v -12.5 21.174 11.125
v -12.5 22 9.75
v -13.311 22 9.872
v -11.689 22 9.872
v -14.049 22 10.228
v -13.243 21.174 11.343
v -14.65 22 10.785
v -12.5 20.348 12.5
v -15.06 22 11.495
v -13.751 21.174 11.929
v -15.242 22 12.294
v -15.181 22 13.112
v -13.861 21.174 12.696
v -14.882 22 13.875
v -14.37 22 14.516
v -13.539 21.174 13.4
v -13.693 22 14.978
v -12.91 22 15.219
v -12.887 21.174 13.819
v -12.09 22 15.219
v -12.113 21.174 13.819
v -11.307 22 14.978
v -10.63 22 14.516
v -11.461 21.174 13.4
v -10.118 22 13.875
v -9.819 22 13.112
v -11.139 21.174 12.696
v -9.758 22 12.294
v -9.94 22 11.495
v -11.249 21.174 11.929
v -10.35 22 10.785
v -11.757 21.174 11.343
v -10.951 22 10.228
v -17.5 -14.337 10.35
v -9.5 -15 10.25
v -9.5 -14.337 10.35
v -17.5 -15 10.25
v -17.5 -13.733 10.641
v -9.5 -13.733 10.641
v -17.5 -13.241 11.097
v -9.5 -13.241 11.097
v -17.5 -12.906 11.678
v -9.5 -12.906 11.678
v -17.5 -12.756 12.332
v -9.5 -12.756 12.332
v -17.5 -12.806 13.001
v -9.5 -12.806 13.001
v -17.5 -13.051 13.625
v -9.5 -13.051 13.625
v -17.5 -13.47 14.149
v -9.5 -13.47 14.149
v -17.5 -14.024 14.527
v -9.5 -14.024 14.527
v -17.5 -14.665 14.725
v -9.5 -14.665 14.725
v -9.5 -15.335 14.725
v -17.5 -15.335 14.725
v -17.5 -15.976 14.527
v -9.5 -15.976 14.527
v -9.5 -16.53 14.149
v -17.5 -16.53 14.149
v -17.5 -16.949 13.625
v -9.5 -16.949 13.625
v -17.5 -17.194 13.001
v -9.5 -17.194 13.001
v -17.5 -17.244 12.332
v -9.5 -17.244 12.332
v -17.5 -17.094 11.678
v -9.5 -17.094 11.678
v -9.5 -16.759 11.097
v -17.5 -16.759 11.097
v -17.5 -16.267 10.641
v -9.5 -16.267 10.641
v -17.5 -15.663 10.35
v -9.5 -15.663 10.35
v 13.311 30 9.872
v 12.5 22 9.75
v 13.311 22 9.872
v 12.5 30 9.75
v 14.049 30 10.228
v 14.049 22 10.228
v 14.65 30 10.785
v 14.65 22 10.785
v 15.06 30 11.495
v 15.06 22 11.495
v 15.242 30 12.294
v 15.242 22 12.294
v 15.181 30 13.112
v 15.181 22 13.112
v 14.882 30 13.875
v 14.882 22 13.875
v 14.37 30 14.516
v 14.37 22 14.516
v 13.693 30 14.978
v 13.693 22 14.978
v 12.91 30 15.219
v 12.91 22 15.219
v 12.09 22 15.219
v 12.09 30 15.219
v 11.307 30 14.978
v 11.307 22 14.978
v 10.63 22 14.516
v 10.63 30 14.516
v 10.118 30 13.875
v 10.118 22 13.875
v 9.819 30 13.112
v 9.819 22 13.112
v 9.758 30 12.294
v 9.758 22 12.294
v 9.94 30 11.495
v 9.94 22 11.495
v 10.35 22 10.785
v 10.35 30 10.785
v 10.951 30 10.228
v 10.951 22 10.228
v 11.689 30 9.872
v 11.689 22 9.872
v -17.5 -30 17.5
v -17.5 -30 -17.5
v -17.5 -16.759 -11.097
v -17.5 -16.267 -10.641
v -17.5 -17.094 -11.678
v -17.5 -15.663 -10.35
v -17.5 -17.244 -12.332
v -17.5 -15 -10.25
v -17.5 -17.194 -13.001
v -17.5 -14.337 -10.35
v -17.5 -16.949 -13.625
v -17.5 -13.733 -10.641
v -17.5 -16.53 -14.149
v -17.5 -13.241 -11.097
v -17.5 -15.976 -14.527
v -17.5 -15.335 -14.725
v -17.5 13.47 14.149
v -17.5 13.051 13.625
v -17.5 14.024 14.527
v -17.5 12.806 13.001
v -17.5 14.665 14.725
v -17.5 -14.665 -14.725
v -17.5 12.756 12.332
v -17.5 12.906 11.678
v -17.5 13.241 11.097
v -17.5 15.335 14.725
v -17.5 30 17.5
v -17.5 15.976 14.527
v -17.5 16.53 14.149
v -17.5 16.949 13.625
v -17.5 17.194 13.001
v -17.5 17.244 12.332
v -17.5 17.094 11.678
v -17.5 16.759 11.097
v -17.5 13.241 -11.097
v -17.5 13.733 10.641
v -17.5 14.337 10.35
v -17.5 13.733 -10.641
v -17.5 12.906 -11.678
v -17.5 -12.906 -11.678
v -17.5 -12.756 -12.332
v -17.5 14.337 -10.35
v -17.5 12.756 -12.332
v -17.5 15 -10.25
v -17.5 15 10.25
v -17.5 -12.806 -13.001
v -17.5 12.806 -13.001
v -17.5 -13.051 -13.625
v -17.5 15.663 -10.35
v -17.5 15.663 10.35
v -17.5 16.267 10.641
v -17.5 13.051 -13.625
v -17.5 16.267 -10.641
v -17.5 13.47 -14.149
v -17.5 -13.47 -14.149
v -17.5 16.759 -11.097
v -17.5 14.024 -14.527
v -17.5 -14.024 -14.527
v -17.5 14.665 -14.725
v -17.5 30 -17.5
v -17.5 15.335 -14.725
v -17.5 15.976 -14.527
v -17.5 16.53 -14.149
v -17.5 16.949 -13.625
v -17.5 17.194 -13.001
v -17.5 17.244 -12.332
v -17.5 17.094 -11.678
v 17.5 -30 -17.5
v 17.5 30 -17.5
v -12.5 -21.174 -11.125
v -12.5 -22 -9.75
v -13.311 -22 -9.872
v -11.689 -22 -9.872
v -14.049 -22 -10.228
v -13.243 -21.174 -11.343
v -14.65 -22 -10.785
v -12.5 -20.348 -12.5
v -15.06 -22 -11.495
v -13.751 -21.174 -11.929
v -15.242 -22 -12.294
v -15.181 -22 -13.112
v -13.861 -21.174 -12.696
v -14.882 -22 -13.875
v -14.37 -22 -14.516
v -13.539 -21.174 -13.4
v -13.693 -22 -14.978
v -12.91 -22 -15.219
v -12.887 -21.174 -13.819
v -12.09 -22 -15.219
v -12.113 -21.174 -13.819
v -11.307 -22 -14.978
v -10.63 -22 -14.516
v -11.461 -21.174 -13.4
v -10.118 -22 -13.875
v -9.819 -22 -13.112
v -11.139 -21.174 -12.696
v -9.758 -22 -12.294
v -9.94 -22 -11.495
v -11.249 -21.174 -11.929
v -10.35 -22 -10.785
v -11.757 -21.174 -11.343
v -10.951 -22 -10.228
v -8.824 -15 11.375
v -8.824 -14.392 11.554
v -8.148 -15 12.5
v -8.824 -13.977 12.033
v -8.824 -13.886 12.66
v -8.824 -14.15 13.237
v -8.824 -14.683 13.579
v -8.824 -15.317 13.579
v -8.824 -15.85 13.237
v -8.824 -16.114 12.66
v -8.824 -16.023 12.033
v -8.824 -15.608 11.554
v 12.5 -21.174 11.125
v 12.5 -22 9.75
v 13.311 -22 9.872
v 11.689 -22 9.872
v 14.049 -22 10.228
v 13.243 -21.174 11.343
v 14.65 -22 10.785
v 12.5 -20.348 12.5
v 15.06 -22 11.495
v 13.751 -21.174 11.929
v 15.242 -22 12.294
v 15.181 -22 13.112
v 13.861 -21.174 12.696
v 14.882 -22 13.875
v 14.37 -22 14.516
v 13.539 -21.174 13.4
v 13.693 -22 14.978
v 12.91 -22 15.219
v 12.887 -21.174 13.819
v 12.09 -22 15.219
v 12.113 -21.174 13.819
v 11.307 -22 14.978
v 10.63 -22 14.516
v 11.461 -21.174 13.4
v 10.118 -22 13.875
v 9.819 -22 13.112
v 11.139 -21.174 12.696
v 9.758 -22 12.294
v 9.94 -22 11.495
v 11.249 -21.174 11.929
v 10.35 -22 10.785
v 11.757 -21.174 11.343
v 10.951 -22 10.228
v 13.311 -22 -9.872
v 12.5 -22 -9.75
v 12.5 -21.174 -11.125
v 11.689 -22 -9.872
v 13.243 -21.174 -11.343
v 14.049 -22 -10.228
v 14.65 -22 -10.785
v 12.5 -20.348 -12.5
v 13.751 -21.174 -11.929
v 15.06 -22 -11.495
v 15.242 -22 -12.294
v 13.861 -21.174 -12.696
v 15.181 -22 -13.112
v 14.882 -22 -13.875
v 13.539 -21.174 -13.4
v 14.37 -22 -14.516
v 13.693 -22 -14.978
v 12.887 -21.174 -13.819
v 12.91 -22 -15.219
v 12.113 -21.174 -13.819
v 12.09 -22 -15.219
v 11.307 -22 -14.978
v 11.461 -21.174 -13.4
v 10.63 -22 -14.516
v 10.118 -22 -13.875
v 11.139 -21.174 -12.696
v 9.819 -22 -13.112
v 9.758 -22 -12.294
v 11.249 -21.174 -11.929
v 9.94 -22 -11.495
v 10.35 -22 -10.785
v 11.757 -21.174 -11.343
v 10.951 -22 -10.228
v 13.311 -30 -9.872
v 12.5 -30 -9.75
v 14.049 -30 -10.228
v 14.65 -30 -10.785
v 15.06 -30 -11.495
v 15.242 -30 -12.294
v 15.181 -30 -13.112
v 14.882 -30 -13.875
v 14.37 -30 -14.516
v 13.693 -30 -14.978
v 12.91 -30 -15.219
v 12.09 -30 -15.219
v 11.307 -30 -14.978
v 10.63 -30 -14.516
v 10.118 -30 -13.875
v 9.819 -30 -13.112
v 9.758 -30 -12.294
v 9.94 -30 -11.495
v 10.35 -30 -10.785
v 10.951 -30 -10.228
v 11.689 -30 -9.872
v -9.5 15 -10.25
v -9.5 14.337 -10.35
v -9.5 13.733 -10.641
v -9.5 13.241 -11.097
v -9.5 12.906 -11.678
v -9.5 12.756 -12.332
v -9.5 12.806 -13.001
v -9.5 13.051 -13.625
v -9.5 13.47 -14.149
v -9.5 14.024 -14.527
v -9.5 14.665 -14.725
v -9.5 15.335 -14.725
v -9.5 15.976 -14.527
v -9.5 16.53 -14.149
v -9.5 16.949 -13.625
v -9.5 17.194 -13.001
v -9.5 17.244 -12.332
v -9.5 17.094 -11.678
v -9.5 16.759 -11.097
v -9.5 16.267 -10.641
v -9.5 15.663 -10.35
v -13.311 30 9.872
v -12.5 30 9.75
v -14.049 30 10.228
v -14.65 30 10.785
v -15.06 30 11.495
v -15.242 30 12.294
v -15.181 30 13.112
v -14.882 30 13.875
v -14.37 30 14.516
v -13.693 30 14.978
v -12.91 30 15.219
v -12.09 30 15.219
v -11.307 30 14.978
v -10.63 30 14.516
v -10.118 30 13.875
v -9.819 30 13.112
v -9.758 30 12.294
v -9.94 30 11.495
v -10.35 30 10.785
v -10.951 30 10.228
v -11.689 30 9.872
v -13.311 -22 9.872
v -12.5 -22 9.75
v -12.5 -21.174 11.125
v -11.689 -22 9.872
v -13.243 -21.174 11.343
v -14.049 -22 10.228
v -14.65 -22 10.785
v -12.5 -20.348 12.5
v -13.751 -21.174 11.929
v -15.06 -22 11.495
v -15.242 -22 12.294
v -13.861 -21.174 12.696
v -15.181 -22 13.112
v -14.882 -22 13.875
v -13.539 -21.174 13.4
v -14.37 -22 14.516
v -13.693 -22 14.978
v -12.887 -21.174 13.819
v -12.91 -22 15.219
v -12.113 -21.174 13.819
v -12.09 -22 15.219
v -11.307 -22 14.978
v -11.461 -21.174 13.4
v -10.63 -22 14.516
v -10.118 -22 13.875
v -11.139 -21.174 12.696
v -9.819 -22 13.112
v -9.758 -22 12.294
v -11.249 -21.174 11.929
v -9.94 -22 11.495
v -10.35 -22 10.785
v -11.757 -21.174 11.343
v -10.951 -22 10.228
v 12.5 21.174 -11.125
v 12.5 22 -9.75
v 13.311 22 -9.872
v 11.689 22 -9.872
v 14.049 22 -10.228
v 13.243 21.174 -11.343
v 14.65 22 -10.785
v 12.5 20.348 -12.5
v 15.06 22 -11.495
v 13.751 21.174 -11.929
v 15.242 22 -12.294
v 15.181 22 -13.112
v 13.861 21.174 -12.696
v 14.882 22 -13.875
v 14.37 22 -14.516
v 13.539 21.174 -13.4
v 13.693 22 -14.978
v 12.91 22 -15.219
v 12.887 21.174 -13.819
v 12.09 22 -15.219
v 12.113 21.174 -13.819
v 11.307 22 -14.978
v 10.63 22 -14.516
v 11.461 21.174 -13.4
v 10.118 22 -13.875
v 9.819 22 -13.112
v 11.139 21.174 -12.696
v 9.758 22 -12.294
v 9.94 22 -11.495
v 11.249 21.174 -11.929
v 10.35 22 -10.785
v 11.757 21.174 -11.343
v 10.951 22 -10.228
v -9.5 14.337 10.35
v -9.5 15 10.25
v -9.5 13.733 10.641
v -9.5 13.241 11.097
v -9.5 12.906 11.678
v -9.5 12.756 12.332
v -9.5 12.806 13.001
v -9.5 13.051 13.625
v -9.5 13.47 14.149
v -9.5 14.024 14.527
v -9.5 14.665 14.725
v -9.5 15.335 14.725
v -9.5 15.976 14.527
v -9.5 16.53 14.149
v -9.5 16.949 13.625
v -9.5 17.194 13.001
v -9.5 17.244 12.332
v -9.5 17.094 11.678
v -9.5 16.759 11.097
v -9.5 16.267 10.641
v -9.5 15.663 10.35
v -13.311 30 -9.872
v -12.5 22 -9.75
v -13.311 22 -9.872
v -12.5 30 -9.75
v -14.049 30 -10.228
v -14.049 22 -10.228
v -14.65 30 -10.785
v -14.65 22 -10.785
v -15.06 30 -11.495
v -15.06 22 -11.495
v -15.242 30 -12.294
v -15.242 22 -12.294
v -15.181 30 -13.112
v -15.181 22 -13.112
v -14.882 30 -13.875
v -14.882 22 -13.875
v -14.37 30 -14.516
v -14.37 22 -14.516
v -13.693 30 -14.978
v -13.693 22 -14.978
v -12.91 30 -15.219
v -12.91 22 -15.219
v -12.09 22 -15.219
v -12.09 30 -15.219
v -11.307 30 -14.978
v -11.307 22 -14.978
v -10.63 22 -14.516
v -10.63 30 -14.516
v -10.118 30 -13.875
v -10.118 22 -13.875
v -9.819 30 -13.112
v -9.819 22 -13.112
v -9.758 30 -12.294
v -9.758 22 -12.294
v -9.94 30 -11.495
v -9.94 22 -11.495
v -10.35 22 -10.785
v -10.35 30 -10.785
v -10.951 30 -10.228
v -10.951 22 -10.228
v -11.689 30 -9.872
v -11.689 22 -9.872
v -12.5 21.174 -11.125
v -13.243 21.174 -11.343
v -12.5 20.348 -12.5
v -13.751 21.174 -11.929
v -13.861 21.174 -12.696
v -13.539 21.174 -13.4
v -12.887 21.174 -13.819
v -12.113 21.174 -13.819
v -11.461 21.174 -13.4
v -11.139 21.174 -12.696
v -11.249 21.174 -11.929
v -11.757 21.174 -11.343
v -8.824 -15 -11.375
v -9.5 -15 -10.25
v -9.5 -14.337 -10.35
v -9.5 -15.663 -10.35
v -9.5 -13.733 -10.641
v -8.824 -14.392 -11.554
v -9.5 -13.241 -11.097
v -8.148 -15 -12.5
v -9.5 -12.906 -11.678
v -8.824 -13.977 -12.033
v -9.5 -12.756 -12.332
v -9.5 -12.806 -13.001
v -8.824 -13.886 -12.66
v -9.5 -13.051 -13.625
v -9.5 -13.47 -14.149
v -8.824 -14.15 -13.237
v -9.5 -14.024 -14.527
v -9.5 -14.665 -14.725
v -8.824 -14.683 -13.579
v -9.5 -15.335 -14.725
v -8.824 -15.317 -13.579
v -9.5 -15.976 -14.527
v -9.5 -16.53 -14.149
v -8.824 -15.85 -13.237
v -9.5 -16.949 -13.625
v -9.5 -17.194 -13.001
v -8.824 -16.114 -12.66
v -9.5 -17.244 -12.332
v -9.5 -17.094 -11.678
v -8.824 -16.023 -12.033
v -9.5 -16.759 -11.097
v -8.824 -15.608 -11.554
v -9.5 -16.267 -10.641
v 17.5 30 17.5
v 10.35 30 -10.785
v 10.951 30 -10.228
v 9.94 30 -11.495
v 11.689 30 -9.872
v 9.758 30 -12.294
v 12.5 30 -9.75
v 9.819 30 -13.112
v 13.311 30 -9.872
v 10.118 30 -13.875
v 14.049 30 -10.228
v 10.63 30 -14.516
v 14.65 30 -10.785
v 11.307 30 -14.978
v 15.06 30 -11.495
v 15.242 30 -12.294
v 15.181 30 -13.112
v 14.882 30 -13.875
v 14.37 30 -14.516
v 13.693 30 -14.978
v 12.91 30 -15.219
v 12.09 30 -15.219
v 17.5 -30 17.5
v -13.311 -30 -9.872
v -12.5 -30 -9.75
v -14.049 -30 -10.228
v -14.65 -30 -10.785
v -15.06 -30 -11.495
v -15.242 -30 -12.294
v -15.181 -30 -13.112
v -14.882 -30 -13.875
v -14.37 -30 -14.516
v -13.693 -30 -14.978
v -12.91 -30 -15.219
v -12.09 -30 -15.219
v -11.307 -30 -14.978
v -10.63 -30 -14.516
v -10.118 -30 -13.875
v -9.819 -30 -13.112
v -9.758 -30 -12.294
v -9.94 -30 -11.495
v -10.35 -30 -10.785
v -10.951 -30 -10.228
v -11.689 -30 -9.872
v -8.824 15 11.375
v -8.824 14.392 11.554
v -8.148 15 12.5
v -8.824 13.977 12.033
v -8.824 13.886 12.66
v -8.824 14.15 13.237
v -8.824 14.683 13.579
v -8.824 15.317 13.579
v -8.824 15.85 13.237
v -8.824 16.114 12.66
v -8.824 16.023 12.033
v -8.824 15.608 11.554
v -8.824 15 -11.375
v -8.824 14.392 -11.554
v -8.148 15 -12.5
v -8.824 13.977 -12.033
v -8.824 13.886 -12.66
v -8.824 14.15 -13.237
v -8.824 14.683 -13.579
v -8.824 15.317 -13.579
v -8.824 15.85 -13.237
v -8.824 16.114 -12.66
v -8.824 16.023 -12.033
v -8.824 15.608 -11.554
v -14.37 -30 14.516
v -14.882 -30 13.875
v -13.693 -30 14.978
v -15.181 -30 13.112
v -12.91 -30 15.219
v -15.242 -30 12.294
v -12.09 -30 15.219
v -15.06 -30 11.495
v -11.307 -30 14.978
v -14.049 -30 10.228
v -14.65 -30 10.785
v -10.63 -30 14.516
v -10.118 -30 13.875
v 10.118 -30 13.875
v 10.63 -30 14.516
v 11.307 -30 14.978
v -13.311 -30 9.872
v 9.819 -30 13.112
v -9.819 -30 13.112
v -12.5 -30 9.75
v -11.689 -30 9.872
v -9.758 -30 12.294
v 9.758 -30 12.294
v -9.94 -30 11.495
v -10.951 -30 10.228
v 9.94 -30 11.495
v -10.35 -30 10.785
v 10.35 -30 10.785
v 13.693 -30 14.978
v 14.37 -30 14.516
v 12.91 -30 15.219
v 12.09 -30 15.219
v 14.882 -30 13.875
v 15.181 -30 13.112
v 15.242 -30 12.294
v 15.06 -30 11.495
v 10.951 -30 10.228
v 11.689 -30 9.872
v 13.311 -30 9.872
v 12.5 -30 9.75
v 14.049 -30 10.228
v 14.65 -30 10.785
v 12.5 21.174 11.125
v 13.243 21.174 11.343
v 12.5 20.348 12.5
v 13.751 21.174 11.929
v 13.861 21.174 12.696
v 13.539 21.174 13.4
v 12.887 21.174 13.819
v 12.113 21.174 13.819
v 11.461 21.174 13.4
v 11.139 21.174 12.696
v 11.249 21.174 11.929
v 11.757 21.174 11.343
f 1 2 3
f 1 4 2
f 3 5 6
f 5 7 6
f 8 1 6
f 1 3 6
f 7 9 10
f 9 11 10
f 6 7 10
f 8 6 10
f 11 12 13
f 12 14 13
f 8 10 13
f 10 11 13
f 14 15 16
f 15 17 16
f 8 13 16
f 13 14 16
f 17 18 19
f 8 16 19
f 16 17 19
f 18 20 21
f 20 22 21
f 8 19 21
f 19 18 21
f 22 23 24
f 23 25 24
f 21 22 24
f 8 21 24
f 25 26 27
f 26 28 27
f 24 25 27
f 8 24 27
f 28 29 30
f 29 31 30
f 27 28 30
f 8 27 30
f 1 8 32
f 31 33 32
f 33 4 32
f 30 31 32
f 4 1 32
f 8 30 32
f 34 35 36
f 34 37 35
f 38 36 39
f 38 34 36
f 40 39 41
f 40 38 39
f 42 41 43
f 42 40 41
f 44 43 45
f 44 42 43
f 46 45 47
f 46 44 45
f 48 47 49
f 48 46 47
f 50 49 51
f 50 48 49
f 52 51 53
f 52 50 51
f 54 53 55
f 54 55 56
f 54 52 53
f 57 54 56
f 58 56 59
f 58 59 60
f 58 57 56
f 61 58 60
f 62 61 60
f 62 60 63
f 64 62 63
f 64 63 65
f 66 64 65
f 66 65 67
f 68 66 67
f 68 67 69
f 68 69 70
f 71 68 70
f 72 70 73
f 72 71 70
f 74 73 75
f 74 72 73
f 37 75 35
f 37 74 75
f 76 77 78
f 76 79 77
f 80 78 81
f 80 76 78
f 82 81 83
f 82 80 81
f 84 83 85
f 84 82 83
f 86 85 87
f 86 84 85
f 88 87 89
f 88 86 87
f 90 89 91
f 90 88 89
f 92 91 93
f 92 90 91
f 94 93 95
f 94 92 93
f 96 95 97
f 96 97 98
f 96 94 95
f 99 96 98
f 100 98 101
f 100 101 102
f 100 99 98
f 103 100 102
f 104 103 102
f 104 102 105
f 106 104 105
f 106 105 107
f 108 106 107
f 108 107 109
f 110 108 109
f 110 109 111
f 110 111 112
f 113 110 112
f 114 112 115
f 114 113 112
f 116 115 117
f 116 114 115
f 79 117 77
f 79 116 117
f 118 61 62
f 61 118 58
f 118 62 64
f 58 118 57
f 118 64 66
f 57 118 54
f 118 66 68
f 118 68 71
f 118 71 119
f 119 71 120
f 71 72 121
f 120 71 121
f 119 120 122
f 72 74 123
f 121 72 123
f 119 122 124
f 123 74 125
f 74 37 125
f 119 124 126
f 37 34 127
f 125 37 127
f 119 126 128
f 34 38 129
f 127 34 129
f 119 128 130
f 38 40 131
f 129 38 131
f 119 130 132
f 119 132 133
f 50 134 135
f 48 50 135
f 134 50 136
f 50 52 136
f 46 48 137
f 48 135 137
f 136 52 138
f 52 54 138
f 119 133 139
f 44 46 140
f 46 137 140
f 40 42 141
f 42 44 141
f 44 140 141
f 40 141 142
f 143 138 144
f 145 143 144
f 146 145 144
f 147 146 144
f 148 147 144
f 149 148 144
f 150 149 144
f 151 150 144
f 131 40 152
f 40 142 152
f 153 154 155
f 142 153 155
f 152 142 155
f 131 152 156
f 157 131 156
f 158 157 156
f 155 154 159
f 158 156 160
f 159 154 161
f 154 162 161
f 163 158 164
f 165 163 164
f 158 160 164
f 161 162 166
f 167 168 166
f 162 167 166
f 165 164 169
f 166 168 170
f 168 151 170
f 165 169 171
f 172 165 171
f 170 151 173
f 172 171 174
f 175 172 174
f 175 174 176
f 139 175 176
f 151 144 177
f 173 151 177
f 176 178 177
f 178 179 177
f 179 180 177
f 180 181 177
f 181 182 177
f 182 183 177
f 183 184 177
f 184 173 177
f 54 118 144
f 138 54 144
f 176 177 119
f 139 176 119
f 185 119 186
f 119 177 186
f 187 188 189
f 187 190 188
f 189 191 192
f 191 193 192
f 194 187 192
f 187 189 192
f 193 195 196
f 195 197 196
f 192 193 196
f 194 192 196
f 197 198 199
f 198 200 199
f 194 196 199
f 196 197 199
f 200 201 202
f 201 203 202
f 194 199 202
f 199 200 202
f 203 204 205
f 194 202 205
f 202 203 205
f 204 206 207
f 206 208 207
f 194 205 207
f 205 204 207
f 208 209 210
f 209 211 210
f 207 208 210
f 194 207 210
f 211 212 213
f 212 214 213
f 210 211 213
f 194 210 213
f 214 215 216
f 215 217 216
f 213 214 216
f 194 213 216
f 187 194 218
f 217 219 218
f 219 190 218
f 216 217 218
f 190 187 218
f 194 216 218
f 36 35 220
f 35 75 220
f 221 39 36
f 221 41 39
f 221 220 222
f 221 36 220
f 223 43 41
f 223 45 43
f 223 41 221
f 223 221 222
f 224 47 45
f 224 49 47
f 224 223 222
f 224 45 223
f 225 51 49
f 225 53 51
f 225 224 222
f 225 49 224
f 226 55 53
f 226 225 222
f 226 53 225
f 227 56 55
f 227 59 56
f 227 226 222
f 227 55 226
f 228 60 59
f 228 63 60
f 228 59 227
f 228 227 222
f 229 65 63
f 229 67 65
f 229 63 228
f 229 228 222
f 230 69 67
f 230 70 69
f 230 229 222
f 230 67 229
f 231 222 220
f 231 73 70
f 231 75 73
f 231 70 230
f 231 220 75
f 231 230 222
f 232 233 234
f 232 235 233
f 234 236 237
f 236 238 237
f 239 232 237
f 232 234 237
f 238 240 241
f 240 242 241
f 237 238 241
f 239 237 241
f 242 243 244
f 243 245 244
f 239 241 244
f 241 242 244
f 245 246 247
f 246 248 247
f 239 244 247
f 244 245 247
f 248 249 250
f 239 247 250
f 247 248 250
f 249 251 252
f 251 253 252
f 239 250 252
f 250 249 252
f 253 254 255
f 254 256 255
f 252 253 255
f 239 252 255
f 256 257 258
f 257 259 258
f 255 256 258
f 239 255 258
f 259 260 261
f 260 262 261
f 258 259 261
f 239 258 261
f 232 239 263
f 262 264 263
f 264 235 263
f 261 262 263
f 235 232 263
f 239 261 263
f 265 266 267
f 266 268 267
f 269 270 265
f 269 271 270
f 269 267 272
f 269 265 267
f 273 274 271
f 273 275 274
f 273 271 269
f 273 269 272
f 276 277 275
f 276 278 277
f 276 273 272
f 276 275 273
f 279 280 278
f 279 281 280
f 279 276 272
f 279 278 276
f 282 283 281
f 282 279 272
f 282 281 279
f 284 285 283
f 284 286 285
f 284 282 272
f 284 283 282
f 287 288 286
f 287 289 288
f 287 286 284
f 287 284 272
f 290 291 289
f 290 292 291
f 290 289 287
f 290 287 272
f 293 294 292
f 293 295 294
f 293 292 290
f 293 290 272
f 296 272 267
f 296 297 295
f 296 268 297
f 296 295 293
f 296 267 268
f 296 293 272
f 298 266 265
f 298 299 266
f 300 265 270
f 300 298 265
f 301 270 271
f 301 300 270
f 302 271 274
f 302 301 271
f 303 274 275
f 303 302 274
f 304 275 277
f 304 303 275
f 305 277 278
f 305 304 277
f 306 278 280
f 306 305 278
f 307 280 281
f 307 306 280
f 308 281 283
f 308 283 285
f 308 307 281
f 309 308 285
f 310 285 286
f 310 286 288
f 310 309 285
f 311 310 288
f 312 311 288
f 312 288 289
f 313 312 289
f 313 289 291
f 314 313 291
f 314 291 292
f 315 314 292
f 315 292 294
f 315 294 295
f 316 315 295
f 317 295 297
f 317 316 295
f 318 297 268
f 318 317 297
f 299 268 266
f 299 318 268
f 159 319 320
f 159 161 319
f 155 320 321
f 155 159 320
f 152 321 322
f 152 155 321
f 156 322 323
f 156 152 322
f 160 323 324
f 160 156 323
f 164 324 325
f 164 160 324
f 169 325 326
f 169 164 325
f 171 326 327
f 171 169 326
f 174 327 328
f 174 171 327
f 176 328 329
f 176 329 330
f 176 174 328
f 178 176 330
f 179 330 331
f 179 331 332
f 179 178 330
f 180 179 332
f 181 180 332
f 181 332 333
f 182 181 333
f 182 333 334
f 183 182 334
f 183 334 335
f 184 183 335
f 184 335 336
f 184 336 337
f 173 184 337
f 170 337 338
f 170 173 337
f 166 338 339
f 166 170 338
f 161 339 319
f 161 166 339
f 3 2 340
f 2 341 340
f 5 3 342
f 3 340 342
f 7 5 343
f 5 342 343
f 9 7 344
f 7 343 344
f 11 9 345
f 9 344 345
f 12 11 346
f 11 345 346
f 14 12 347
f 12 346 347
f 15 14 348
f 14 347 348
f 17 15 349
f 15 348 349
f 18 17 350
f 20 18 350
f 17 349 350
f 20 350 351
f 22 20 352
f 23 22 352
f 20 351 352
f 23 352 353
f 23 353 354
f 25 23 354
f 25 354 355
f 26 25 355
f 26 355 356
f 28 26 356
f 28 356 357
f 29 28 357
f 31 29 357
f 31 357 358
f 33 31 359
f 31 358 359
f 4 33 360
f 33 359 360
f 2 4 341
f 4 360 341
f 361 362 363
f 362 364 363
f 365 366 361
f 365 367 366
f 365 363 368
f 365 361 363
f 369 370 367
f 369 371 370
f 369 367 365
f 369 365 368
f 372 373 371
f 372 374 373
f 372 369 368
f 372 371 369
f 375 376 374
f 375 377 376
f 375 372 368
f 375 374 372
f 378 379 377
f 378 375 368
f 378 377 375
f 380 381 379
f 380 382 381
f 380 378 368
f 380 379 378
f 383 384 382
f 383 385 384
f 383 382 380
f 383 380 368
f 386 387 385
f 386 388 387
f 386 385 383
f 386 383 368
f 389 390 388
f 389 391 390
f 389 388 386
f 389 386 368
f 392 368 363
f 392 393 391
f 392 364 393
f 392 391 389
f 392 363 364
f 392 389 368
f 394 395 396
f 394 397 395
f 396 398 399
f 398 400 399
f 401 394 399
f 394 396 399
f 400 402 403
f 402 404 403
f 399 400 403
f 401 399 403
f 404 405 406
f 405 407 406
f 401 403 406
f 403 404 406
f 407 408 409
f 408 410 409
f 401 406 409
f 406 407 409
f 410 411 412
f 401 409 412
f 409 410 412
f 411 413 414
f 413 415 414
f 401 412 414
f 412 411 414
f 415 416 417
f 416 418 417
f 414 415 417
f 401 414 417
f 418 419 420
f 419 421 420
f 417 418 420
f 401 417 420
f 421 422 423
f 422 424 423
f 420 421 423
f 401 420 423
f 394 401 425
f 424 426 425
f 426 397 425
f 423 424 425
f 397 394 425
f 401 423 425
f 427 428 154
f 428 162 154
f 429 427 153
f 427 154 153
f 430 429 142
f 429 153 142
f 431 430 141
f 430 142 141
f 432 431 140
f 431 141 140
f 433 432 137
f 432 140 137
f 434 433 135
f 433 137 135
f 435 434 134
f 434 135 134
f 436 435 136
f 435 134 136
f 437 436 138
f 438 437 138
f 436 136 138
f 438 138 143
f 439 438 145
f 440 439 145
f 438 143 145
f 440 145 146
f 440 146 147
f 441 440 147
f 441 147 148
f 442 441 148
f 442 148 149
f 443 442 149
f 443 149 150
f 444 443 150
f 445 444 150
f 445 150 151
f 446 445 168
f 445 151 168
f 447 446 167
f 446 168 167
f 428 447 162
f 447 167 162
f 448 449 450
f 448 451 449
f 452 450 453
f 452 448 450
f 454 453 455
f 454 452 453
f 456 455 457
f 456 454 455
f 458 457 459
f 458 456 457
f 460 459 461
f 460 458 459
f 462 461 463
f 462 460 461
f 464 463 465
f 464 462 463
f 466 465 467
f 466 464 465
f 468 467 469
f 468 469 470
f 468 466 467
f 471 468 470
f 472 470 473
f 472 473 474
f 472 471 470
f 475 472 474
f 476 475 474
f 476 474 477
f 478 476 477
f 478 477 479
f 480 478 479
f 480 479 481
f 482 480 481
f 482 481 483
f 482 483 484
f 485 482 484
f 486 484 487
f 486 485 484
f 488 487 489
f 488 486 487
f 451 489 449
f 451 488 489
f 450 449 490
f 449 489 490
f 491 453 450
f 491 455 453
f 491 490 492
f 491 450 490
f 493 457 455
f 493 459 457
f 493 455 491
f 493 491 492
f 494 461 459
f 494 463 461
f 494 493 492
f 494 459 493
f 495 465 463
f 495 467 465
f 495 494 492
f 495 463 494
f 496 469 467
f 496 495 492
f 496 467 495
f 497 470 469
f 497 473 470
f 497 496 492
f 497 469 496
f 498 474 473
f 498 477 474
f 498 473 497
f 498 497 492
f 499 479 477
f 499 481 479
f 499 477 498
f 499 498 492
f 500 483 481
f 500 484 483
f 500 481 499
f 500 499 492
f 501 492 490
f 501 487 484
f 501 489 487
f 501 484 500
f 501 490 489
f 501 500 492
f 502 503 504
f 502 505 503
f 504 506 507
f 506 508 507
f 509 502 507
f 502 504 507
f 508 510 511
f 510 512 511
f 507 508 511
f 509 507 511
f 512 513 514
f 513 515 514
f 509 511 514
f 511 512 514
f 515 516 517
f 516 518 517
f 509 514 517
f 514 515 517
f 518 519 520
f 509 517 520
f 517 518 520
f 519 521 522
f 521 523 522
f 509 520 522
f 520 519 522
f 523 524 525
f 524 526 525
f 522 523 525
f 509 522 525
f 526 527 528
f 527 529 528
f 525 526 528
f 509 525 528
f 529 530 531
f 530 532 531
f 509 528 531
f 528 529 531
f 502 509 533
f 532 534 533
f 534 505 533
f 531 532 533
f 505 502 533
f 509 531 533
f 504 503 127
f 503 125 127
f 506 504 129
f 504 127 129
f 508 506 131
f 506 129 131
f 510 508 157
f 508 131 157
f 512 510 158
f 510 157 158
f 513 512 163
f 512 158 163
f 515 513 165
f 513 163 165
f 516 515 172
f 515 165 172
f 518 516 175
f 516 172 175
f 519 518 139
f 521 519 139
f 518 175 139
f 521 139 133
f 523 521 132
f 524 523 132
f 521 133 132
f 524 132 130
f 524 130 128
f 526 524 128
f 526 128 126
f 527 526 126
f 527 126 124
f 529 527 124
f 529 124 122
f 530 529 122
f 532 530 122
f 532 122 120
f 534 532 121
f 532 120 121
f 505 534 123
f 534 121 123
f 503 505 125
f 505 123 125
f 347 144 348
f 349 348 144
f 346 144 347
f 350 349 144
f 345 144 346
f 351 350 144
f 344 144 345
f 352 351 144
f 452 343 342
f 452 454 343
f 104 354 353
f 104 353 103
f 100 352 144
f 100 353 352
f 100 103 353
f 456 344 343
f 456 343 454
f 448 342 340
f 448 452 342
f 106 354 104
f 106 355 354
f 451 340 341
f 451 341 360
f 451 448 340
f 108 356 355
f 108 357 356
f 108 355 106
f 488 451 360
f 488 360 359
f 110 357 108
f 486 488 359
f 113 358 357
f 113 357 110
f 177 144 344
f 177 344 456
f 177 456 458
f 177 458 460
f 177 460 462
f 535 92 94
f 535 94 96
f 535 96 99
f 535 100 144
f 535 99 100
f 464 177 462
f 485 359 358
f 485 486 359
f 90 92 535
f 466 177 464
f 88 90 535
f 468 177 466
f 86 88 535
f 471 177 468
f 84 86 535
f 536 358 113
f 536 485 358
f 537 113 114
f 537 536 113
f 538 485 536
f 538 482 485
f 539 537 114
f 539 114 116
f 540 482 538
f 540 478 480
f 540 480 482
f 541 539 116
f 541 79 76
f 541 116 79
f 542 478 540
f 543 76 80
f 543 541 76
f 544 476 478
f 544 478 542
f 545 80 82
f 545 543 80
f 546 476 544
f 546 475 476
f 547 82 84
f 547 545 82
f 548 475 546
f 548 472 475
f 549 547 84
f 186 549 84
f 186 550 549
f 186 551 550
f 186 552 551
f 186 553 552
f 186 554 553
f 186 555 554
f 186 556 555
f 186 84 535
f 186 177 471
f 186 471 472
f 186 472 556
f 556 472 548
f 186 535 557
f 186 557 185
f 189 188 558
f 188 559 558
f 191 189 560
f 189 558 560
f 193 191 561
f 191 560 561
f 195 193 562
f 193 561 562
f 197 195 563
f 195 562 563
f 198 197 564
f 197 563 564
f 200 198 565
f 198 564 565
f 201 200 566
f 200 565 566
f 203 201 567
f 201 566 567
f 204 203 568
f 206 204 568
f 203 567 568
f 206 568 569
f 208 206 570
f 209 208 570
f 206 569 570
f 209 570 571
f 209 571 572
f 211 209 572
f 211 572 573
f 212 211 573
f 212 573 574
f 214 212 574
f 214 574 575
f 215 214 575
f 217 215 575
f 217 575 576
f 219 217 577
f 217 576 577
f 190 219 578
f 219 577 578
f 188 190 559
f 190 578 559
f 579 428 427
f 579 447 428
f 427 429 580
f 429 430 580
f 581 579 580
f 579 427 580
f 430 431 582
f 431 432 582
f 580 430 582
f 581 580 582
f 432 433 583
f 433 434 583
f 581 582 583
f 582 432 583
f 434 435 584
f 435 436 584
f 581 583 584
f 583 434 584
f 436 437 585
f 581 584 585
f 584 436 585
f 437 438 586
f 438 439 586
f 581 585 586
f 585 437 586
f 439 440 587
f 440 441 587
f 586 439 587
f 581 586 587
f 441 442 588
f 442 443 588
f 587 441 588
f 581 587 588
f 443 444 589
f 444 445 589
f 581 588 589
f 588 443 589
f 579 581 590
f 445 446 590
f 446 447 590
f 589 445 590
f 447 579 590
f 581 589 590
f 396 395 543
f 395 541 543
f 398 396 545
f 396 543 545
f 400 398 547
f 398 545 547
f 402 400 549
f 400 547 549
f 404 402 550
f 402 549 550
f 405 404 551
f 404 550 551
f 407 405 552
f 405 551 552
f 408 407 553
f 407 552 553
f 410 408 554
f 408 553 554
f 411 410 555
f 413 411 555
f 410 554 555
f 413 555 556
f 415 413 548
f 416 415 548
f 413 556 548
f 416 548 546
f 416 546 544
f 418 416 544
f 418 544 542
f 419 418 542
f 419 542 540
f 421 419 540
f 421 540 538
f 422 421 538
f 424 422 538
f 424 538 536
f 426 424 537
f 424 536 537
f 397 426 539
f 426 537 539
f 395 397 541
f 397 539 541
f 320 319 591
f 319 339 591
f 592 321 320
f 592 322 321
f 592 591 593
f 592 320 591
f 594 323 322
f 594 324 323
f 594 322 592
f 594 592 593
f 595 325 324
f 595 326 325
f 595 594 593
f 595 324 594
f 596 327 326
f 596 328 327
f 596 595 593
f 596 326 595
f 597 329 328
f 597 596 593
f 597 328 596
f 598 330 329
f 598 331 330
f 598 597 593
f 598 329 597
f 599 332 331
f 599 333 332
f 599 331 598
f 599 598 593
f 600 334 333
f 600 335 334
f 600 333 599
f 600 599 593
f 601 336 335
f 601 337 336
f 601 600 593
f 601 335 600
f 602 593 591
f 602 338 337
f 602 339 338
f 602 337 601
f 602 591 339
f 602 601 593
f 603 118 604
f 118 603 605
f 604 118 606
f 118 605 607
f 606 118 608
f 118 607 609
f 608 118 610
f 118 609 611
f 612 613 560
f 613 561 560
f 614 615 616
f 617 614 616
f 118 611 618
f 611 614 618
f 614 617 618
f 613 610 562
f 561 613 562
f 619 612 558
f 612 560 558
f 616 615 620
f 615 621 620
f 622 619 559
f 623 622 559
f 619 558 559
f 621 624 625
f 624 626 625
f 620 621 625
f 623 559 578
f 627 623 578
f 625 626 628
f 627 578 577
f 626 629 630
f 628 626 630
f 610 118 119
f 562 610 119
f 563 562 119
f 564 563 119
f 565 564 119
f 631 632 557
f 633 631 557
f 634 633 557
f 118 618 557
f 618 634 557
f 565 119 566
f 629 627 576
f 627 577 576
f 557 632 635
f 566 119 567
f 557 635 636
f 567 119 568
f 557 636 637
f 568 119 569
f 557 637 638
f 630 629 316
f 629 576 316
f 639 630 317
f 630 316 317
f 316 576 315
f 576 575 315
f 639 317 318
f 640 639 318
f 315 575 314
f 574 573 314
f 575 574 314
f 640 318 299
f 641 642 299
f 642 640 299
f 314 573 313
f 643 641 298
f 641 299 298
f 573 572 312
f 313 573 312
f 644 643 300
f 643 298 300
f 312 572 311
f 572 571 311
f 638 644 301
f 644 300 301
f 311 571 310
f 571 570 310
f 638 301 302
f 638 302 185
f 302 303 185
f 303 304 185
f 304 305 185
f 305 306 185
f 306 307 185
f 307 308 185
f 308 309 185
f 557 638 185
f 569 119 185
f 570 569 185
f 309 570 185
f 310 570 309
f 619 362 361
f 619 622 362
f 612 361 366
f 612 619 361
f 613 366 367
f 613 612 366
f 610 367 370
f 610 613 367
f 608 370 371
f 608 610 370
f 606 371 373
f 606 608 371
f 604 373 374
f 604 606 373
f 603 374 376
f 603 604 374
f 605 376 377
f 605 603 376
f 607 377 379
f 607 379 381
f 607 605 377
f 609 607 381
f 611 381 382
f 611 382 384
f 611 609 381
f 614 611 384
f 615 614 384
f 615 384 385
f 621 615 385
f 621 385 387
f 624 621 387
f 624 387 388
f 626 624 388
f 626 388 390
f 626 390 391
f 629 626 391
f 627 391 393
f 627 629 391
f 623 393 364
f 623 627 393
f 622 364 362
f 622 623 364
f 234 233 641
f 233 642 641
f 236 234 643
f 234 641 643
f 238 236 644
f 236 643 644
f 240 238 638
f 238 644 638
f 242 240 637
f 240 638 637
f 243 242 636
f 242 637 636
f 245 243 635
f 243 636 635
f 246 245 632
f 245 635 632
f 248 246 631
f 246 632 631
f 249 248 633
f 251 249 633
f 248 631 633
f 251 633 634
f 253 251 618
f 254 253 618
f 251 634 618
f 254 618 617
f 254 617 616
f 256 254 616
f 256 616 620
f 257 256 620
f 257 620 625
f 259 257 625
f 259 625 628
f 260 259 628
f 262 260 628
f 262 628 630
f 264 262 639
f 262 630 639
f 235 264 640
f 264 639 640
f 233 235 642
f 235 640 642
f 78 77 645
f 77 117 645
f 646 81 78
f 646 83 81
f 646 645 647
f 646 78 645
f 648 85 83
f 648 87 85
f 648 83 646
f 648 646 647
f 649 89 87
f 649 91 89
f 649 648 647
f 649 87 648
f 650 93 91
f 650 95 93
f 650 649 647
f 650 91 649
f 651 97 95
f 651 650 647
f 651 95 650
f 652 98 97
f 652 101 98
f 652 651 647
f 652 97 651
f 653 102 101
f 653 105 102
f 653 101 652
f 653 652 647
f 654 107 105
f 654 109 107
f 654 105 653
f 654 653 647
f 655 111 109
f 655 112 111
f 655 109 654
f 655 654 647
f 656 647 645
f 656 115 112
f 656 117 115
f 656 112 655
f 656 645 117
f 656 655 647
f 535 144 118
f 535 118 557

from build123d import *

# Parameters (mm, degrees)
SKETCH1_W           = 35
SKETCH1_H           = 35
BOSS_EXTRUDE1_DEPTH = 30


with BuildPart() as part:
    # Sketch1 → Boss-Extrude1 (new, symmetric)
    with BuildSketch(Plane(origin=(0, 0, 0), x_dir=(1, 0, 0), z_dir=(0, 1, 0))):
        Rectangle(SKETCH1_W, SKETCH1_H)
    extrude(amount=BOSS_EXTRUDE1_DEPTH, both=True)

    # Sketch3 → M5 Clearance Hole1 (revolve, cut)
    with BuildSketch(Plane(origin=(-12.5, 30, -12.5), x_dir=(0, 0, 1), z_dir=(1, 0, 0))):
        Polygon((0, 0), (0, 9.652366702), (2.75, 8), (2.75, 0), align=None)
    m5_clearance_hole1 = revolve(axis=Axis((-12.5, 36.35, -12.5), (0, -1, 0)), mode=Mode.SUBTRACT)

    # Mirror1: M5 Clearance Hole1 across plane
    add(m5_clearance_hole1.mirror(Plane(origin=(0, 0, 0), x_dir=(0, 0, 1), z_dir=(1, 0, 0))), mode=Mode.SUBTRACT)

    # Mirror2: M5 Clearance Hole1 across plane
    add(m5_clearance_hole1.mirror(Plane.XY), mode=Mode.SUBTRACT)

    # Mirror2 copy 1 sketch → Mirror2 copy 1 (revolve, cut)
    with BuildSketch(Plane(origin=(12.5, 30, 12.5), x_dir=(0, 0, -1), z_dir=(-1, 0, 0))):
        Polygon((0, 0), (0, 9.652366702), (2.75, 8), (2.75, 0), align=None)
    revolve(axis=Axis((12.5, 36.35, 12.5), (0, -1, 0)), mode=Mode.SUBTRACT)

    # Mirror3: M5 Clearance Hole1 across plane
    add(m5_clearance_hole1.mirror(Plane.ZX), mode=Mode.SUBTRACT)

    # Mirror3 copy 1 sketch → Mirror3 copy 1 (revolve, cut)
    with BuildSketch(Plane(origin=(12.5, -30, -12.5), x_dir=(0, 0, 1), z_dir=(-1, 0, 0))):
        Polygon((0, 0), (0, 9.652366702), (2.75, 8), (2.75, 0), align=None)
    revolve(axis=Axis((12.5, -36.35, -12.5), (0, 1, 0)), mode=Mode.SUBTRACT)

    # Mirror3 copy 2 sketch → Mirror3 copy 2 (revolve, cut)
    with BuildSketch(Plane(origin=(-12.5, -30, 12.5), x_dir=(0, 0, -1), z_dir=(1, 0, 0))):
        Polygon((0, 0), (0, 9.652366702), (2.75, 8), (2.75, 0), align=None)
    revolve(axis=Axis((-12.5, -36.35, 12.5), (0, 1, 0)), mode=Mode.SUBTRACT)

    # Mirror3 copy 3 sketch → Mirror3 copy 3 (revolve, cut)
    with BuildSketch(Plane(origin=(12.5, -30, 12.5), x_dir=(0, 0, -1), z_dir=(-1, 0, 0))):
        Polygon((0, 0), (0, -9.652366702), (2.75, -8), (2.75, 0), align=None)
    revolve(axis=Axis((12.5, -36.35, 12.5), (0, -1, 0)), mode=Mode.SUBTRACT)

    # Sketch8 → M4 Clearance Hole2 (revolve, cut)
    with BuildSketch(Plane(origin=(-17.5, 15, -12.5), x_dir=(0, 0, 1), z_dir=(0, 1, 0))):
        Polygon((0, 0), (0, 9.351936393), (2.25, 8), (2.25, 0), align=None)
    m4_clearance_hole2 = revolve(axis=Axis((-23.85, 15, -12.5), (1, 0, 0)), mode=Mode.SUBTRACT)

    # Mirror4: M4 Clearance Hole2 across plane
    add(m4_clearance_hole2.mirror(Plane.XY), mode=Mode.SUBTRACT)

    # Mirror5: M4 Clearance Hole2 across plane
    add(m4_clearance_hole2.mirror(Plane.ZX), mode=Mode.SUBTRACT)

    # Mirror5 copy 1 sketch → Mirror5 copy 1 (revolve, cut)
    with BuildSketch(Plane(origin=(-17.5, -15, 12.5), x_dir=(0, 0, -1), z_dir=(0, -1, 0))):
        Polygon((0, 0), (0, 9.351936393), (2.25, 8), (2.25, 0), align=None)
    revolve(axis=Axis((-23.85, -15, 12.5), (1, 0, 0)), mode=Mode.SUBTRACT)


solid = part.part
